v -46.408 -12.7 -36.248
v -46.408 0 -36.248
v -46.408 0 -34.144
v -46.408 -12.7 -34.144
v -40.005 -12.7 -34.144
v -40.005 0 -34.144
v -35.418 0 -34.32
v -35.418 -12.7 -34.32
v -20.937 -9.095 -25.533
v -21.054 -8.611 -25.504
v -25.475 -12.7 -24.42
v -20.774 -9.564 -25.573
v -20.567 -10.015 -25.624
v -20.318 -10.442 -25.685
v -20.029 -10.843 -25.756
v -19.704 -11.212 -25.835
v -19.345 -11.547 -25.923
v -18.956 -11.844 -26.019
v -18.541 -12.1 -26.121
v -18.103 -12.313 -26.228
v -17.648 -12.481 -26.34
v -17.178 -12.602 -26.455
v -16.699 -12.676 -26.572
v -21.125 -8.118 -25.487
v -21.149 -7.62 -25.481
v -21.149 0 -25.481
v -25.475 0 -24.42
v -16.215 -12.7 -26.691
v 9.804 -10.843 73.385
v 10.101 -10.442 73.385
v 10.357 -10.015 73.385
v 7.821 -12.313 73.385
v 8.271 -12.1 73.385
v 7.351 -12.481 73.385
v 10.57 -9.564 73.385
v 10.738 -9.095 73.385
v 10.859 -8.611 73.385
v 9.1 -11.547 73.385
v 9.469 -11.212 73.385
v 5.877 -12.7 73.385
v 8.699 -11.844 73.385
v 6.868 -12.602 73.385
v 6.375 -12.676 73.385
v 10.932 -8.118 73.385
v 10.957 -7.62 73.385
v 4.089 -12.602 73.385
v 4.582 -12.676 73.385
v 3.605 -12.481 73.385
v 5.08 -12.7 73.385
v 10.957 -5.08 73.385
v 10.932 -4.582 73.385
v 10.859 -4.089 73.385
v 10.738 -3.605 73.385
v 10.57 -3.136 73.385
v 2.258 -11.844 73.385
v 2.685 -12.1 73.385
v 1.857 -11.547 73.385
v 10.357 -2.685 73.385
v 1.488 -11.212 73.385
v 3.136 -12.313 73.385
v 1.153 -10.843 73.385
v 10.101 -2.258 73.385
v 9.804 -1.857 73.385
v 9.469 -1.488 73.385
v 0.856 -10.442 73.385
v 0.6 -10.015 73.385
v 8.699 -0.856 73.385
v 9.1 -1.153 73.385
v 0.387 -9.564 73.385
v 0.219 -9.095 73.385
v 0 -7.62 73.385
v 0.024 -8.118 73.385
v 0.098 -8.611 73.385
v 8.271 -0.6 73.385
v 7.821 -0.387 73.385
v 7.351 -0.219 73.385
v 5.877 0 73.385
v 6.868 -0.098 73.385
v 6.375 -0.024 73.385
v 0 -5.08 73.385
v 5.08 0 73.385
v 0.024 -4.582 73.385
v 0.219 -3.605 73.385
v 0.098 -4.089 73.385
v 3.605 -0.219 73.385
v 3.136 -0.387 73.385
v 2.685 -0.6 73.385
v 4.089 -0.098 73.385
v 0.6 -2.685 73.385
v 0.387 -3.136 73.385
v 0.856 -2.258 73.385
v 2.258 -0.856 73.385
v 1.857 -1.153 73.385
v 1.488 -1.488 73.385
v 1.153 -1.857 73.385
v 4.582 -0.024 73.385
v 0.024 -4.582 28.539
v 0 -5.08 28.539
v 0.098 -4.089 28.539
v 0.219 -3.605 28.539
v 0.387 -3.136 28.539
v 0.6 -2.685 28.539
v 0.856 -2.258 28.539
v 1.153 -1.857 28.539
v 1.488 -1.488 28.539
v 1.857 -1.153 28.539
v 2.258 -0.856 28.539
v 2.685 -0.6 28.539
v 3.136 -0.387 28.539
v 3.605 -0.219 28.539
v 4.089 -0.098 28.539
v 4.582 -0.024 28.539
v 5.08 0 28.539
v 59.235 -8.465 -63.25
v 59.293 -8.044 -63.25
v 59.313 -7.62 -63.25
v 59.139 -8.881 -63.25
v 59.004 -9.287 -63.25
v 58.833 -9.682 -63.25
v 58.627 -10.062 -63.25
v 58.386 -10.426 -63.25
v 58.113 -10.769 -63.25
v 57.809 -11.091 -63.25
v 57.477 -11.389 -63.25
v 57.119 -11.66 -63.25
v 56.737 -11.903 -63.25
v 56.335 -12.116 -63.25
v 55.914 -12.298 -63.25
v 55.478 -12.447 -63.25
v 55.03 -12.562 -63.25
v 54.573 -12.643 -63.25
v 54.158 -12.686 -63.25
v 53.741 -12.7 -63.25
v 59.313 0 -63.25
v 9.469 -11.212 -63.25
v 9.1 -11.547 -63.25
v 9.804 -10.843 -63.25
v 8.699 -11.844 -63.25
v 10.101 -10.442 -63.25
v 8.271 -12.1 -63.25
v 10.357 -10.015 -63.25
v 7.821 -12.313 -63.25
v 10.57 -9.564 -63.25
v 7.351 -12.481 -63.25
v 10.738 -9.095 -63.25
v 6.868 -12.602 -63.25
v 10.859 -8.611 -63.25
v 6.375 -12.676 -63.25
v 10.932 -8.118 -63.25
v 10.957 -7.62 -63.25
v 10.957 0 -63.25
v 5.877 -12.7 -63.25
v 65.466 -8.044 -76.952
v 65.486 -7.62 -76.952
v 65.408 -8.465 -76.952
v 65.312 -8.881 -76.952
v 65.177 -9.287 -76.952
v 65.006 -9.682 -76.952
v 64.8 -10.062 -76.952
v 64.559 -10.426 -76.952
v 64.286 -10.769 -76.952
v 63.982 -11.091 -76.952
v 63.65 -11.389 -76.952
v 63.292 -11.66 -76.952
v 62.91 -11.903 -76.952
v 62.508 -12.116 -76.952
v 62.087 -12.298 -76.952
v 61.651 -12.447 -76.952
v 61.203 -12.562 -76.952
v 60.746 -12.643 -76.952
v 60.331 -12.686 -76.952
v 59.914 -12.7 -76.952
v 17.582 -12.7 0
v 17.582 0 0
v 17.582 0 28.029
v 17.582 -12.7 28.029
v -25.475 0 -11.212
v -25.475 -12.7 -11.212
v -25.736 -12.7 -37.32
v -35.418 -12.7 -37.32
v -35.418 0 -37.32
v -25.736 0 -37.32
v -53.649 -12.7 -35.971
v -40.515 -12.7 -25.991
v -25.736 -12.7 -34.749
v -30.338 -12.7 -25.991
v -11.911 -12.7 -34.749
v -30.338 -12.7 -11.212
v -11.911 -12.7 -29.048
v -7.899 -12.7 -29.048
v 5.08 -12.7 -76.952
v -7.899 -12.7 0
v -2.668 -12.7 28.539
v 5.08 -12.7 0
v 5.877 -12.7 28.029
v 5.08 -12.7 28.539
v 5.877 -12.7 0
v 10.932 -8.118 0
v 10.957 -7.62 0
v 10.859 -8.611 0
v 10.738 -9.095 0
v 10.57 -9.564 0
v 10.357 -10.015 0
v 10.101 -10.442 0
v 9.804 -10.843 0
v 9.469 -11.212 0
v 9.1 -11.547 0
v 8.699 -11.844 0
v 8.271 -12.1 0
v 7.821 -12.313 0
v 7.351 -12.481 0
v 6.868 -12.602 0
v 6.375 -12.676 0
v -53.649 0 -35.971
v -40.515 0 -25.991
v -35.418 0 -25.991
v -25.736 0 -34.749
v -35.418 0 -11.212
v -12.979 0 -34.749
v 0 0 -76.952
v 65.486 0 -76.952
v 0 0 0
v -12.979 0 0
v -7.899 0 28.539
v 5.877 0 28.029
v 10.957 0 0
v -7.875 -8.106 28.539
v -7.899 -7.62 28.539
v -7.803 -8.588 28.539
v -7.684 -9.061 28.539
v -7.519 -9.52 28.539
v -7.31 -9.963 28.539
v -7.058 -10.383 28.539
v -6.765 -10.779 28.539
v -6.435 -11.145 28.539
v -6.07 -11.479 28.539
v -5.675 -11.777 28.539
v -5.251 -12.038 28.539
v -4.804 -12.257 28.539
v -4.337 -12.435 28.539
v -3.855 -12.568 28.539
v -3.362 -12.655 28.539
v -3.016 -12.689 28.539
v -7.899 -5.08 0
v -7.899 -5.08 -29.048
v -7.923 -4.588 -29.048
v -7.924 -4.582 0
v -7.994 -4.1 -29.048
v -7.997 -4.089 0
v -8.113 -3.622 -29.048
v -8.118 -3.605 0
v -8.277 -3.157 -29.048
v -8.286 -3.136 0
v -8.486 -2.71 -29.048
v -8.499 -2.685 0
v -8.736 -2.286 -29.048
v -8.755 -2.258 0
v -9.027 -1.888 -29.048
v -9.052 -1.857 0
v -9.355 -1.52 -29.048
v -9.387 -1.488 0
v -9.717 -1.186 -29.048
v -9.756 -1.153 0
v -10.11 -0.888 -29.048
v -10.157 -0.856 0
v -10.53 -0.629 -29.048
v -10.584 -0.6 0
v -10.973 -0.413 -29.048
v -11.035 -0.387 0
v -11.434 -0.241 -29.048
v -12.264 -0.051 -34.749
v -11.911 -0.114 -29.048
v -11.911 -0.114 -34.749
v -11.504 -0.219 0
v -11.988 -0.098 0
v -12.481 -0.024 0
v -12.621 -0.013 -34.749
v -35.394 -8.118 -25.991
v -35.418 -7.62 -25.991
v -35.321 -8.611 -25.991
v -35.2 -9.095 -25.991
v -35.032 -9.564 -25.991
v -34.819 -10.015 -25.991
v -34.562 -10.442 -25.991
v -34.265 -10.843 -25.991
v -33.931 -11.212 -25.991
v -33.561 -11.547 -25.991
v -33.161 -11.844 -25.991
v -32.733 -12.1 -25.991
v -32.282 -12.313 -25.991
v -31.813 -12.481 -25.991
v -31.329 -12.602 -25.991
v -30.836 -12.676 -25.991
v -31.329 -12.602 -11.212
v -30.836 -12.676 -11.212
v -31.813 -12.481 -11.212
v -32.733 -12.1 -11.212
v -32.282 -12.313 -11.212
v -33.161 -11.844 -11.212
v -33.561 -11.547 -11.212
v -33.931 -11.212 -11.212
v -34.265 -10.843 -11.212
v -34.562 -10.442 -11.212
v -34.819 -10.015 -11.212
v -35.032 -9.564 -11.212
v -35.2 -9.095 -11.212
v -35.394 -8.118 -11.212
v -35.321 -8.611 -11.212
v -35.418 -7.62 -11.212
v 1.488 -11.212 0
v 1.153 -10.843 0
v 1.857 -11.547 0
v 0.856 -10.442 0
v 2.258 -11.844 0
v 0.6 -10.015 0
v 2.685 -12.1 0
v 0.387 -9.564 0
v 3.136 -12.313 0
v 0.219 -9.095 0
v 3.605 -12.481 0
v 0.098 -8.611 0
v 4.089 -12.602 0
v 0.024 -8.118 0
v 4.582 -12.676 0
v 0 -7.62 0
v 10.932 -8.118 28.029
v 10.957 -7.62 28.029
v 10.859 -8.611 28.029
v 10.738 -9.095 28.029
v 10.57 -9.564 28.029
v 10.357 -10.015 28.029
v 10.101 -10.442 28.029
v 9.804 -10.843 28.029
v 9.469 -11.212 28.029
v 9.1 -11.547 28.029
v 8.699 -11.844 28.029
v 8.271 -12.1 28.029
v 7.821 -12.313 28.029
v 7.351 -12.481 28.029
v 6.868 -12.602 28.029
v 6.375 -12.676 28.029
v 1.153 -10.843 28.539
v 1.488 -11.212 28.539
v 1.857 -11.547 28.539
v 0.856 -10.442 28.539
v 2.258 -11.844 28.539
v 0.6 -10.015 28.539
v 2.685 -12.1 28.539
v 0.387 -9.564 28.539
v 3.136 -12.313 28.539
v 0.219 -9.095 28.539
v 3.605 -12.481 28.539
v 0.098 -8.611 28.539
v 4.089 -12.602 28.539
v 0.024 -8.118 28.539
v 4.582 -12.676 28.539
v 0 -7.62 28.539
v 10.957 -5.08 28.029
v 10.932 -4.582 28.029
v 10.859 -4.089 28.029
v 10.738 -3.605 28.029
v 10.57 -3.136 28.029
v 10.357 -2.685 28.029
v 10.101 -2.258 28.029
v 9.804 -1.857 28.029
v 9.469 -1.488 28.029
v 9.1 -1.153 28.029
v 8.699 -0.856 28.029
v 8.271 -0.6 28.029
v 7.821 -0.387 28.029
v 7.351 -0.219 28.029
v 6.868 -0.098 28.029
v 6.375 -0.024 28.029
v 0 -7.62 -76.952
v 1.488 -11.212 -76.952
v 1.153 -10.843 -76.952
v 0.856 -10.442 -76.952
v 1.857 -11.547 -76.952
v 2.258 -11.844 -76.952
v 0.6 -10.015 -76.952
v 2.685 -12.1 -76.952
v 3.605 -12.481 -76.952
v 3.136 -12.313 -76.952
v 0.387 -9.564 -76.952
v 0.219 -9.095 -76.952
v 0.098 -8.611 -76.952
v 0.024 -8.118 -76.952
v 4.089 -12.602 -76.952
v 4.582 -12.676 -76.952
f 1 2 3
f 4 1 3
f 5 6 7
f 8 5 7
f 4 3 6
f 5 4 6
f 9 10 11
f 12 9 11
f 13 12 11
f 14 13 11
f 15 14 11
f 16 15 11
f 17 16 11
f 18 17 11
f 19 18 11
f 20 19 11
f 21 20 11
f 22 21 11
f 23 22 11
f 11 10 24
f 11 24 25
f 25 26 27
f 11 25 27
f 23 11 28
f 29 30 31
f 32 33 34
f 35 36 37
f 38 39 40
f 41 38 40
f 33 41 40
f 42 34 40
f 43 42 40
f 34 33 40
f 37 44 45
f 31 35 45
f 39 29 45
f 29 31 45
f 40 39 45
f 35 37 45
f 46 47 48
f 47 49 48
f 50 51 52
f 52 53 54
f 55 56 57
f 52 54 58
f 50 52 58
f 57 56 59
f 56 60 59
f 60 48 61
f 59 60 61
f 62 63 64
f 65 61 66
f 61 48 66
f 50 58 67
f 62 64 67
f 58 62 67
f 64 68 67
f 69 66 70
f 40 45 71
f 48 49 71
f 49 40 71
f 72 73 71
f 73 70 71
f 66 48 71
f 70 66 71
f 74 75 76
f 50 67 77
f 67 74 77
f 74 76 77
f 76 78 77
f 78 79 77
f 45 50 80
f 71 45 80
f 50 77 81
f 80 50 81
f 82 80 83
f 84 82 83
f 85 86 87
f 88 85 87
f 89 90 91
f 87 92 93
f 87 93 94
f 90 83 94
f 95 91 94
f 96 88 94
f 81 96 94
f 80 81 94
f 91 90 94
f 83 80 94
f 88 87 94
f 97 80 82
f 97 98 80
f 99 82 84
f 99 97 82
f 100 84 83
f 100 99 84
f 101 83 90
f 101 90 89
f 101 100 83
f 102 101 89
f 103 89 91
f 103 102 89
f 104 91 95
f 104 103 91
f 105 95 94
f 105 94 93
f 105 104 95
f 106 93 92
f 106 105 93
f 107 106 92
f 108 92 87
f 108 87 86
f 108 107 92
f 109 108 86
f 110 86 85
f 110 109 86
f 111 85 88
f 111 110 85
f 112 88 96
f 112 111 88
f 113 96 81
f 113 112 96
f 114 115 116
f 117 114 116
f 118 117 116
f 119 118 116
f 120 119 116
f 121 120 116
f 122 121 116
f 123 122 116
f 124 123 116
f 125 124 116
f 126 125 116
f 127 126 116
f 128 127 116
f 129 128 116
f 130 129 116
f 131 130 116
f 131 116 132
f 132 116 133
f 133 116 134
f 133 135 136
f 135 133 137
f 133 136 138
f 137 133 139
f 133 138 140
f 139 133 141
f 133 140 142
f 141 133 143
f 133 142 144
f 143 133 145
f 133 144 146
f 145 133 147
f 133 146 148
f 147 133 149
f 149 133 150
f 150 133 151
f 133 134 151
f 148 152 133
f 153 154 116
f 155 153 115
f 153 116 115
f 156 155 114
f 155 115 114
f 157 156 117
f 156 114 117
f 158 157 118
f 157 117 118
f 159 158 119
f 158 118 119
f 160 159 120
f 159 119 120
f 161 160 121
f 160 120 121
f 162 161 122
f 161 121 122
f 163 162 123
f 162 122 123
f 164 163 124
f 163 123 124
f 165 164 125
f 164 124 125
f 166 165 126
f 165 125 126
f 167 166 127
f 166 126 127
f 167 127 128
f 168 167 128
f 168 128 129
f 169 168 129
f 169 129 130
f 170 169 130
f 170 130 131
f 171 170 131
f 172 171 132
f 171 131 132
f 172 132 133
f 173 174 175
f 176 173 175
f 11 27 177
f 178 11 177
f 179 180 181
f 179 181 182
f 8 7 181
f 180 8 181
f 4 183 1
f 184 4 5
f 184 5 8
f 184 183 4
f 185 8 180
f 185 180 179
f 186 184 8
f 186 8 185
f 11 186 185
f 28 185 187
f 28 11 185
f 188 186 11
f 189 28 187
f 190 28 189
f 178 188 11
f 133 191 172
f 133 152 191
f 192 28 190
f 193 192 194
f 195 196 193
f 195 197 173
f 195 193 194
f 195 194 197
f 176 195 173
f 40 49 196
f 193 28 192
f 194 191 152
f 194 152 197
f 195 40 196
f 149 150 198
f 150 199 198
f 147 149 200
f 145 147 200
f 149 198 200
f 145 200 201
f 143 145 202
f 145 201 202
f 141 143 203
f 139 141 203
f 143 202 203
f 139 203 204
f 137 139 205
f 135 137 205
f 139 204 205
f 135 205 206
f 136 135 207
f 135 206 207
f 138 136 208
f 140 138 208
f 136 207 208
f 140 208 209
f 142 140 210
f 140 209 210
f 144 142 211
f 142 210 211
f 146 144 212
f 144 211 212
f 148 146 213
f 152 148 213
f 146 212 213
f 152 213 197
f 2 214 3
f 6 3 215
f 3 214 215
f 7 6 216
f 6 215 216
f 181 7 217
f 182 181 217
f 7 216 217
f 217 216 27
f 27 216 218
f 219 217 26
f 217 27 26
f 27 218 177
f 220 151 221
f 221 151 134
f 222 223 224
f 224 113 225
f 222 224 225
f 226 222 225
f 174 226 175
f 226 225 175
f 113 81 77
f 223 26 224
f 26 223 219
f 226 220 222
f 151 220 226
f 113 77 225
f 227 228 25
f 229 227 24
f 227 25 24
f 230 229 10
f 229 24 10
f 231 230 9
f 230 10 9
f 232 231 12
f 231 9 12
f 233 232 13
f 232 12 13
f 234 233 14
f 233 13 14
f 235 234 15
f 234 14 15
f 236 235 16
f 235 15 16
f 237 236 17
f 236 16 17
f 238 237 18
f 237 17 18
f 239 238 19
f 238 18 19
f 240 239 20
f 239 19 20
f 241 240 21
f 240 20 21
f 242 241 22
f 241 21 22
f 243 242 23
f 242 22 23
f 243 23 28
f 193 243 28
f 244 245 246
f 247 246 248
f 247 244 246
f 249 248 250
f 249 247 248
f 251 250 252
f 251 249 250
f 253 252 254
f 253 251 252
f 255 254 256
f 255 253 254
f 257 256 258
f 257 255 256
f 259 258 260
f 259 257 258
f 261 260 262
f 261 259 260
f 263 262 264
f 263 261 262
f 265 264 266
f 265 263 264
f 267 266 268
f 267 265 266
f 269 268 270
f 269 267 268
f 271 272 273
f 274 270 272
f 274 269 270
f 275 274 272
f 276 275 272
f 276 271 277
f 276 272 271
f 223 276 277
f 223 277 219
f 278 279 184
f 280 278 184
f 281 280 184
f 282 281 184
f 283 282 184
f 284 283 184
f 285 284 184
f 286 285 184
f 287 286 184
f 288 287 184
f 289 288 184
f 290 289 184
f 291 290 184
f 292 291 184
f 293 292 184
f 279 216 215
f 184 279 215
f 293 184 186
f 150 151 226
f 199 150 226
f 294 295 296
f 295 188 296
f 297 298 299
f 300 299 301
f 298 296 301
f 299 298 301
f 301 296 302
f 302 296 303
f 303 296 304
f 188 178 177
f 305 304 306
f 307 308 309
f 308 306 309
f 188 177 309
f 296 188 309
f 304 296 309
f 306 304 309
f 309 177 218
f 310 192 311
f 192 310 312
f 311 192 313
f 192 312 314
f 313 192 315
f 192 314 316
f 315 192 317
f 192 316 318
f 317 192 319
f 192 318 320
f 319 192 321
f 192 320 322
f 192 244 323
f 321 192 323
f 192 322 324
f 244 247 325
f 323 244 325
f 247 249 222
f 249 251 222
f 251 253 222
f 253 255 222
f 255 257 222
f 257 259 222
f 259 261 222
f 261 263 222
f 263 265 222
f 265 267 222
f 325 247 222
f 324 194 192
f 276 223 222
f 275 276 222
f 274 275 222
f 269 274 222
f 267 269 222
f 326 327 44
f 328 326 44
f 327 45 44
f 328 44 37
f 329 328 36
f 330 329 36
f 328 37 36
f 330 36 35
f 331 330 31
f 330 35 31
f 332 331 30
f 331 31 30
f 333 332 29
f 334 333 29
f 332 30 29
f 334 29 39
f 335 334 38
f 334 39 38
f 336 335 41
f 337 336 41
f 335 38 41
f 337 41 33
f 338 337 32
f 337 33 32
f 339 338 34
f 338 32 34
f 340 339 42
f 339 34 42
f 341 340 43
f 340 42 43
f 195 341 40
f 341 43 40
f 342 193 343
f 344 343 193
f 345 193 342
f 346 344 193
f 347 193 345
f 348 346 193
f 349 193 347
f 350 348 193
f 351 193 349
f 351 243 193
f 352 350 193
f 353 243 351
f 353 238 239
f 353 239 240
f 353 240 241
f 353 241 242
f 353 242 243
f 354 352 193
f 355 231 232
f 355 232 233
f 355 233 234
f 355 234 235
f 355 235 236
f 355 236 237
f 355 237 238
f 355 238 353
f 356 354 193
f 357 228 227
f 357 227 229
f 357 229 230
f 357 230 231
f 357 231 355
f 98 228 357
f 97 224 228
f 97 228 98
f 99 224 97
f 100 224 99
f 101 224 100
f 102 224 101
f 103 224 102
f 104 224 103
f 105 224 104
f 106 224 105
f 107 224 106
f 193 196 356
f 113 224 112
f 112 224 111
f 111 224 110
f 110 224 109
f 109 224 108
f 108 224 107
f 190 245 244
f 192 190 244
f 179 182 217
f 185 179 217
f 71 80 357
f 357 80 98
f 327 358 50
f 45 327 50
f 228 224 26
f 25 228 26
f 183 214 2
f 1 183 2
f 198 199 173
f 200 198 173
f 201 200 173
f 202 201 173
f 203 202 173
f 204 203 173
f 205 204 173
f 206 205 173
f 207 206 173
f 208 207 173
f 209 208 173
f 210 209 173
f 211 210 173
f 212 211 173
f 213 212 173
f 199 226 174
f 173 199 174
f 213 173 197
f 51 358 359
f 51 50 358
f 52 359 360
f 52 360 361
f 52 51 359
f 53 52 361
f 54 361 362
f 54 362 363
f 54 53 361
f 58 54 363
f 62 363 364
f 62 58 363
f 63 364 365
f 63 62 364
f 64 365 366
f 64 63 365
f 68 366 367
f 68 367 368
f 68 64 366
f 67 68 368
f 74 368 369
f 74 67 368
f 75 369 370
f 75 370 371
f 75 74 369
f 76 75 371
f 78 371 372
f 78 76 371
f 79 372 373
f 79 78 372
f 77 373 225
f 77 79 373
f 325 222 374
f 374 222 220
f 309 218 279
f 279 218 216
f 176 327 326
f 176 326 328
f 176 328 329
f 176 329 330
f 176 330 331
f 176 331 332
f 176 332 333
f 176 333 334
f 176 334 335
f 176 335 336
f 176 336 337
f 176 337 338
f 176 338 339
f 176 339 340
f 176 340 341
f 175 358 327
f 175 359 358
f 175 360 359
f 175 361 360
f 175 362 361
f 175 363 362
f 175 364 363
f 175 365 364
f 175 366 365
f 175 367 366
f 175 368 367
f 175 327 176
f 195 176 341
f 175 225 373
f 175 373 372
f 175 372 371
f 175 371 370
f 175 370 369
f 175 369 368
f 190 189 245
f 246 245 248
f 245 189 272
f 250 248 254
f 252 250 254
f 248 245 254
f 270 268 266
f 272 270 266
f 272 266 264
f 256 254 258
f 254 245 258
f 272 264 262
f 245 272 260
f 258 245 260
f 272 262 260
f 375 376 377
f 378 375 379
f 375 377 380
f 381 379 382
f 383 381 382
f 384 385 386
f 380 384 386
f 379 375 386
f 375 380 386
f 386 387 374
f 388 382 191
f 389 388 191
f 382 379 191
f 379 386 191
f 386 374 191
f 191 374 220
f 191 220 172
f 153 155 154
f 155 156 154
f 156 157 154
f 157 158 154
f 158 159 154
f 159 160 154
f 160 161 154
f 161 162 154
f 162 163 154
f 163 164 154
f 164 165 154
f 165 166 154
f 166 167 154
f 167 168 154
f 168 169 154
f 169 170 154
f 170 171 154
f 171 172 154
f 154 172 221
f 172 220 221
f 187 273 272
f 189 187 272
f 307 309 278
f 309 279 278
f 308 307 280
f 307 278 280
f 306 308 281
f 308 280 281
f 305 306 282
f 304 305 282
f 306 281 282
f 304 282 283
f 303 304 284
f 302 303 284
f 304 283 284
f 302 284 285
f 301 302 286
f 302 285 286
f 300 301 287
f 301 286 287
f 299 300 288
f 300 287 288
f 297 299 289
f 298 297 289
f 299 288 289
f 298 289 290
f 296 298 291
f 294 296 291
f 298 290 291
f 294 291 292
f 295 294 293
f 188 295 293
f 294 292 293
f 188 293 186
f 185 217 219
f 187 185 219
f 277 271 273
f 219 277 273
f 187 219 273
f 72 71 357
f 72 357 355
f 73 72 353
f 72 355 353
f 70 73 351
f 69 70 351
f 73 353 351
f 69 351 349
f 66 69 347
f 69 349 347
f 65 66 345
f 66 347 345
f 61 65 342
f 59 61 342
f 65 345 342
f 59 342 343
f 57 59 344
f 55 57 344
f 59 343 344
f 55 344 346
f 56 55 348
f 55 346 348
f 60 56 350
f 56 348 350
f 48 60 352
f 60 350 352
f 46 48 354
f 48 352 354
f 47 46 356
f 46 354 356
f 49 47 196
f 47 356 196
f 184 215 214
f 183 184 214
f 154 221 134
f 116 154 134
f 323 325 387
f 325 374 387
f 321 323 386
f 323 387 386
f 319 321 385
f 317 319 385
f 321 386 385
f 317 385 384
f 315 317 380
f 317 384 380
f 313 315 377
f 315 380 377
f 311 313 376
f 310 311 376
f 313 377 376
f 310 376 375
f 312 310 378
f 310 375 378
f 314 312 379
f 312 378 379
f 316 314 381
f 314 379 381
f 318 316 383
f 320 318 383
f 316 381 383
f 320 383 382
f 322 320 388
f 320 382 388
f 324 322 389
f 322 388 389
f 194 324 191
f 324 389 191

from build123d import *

# Parameters (mm, degrees)
F0_W     = 7.8990748152
F0_H     = 28.538595885
F0_W_2   = 6.6250311211
F0_H_2   = 28.0289780349
F1_DEPTH = 12.7
F2_R     = 5.08


# Not quite as in the source:
# - two fillets or chamfers of one size are made in one step


with BuildPart() as f1:
    # F0 (on Front) → F1 (new body)
    with BuildSketch(Plane.XZ):
        Polygon((10.9567856416, 73.384962976), (0, 73.384962976), (0, 28.538595885), (0, 0), (0, -76.9523009658), (10.9567856416, -76.9523009658), (10.9567856416, -63.2497891784), (10.9567856416, -57.5868189335), (10.9567856416, 0), (10.9567856416, 28.0289780349), align=None)
        with Locations((-3.9495374076, 14.2692979425)):
            Rectangle(F0_W, F0_H)
        with Locations((14.2693012021, 14.0144890174)):
            Rectangle(F0_W_2, F0_H_2)
        Polygon((-7.8990748152, 0), (-7.8990748152, 28.538595885), (-21.1491379887, -25.4808943719), (-25.4754136512, -24.4197324549), (-25.7356986403, -29.0482211858), (-11.9106527418, -29.0482211858), (-7.8990748152, -29.0482211858), align=None)
        Polygon((10.9567856416, -63.2497891784), (10.9567856416, -76.9523009658), (65.48589468, -76.9523009658), (59.3128465116, -63.2497891784), align=None)
        Polygon((-25.7356986403, -29.0482211858), (-25.4754136512, -24.4197324549), (-25.4754136512, -11.2115936354), (-35.4184396565, -11.2115936354), (-35.4184396565, -25.9905140847), (-40.5146181583, -25.9905140847), (-53.649477917, -35.9711753499), (-46.4077852666, -36.2483747303), (-46.4077852666, -34.144397825), (-40.0049984455, -34.144397825), (-35.4184396565, -34.3199633062), (-35.4184396565, -37.3197160661), (-25.7356986403, -37.3197160661), (-25.7356986403, -34.7485020757), (-11.9106527418, -34.7485020757), (-11.9106527418, -29.0482211858), align=None)
    extrude(amount=F1_DEPTH)

    # F2
    f2_edges = [f1.edges().sort_by_distance(p)[0] for p in [
        (-35.41844, -12.7, -18.601054),
        (10.956786, -12.7, -31.624895),
        (0, -12.7, 50.961779),
        (0, -12.7, -38.47615),
        (0, 0, 50.961779),
        (-14.524106, -12.7, 1.528851),
        (-7.899075, 0, -14.524111),
        (62.399371, -12.7, -70.101045),
        (10.956786, 0, 50.706971),
        (10.956786, -12.7, 50.706971),
    ]]
    fillet(f2_edges, radius=F2_R)


solid = f1.part
